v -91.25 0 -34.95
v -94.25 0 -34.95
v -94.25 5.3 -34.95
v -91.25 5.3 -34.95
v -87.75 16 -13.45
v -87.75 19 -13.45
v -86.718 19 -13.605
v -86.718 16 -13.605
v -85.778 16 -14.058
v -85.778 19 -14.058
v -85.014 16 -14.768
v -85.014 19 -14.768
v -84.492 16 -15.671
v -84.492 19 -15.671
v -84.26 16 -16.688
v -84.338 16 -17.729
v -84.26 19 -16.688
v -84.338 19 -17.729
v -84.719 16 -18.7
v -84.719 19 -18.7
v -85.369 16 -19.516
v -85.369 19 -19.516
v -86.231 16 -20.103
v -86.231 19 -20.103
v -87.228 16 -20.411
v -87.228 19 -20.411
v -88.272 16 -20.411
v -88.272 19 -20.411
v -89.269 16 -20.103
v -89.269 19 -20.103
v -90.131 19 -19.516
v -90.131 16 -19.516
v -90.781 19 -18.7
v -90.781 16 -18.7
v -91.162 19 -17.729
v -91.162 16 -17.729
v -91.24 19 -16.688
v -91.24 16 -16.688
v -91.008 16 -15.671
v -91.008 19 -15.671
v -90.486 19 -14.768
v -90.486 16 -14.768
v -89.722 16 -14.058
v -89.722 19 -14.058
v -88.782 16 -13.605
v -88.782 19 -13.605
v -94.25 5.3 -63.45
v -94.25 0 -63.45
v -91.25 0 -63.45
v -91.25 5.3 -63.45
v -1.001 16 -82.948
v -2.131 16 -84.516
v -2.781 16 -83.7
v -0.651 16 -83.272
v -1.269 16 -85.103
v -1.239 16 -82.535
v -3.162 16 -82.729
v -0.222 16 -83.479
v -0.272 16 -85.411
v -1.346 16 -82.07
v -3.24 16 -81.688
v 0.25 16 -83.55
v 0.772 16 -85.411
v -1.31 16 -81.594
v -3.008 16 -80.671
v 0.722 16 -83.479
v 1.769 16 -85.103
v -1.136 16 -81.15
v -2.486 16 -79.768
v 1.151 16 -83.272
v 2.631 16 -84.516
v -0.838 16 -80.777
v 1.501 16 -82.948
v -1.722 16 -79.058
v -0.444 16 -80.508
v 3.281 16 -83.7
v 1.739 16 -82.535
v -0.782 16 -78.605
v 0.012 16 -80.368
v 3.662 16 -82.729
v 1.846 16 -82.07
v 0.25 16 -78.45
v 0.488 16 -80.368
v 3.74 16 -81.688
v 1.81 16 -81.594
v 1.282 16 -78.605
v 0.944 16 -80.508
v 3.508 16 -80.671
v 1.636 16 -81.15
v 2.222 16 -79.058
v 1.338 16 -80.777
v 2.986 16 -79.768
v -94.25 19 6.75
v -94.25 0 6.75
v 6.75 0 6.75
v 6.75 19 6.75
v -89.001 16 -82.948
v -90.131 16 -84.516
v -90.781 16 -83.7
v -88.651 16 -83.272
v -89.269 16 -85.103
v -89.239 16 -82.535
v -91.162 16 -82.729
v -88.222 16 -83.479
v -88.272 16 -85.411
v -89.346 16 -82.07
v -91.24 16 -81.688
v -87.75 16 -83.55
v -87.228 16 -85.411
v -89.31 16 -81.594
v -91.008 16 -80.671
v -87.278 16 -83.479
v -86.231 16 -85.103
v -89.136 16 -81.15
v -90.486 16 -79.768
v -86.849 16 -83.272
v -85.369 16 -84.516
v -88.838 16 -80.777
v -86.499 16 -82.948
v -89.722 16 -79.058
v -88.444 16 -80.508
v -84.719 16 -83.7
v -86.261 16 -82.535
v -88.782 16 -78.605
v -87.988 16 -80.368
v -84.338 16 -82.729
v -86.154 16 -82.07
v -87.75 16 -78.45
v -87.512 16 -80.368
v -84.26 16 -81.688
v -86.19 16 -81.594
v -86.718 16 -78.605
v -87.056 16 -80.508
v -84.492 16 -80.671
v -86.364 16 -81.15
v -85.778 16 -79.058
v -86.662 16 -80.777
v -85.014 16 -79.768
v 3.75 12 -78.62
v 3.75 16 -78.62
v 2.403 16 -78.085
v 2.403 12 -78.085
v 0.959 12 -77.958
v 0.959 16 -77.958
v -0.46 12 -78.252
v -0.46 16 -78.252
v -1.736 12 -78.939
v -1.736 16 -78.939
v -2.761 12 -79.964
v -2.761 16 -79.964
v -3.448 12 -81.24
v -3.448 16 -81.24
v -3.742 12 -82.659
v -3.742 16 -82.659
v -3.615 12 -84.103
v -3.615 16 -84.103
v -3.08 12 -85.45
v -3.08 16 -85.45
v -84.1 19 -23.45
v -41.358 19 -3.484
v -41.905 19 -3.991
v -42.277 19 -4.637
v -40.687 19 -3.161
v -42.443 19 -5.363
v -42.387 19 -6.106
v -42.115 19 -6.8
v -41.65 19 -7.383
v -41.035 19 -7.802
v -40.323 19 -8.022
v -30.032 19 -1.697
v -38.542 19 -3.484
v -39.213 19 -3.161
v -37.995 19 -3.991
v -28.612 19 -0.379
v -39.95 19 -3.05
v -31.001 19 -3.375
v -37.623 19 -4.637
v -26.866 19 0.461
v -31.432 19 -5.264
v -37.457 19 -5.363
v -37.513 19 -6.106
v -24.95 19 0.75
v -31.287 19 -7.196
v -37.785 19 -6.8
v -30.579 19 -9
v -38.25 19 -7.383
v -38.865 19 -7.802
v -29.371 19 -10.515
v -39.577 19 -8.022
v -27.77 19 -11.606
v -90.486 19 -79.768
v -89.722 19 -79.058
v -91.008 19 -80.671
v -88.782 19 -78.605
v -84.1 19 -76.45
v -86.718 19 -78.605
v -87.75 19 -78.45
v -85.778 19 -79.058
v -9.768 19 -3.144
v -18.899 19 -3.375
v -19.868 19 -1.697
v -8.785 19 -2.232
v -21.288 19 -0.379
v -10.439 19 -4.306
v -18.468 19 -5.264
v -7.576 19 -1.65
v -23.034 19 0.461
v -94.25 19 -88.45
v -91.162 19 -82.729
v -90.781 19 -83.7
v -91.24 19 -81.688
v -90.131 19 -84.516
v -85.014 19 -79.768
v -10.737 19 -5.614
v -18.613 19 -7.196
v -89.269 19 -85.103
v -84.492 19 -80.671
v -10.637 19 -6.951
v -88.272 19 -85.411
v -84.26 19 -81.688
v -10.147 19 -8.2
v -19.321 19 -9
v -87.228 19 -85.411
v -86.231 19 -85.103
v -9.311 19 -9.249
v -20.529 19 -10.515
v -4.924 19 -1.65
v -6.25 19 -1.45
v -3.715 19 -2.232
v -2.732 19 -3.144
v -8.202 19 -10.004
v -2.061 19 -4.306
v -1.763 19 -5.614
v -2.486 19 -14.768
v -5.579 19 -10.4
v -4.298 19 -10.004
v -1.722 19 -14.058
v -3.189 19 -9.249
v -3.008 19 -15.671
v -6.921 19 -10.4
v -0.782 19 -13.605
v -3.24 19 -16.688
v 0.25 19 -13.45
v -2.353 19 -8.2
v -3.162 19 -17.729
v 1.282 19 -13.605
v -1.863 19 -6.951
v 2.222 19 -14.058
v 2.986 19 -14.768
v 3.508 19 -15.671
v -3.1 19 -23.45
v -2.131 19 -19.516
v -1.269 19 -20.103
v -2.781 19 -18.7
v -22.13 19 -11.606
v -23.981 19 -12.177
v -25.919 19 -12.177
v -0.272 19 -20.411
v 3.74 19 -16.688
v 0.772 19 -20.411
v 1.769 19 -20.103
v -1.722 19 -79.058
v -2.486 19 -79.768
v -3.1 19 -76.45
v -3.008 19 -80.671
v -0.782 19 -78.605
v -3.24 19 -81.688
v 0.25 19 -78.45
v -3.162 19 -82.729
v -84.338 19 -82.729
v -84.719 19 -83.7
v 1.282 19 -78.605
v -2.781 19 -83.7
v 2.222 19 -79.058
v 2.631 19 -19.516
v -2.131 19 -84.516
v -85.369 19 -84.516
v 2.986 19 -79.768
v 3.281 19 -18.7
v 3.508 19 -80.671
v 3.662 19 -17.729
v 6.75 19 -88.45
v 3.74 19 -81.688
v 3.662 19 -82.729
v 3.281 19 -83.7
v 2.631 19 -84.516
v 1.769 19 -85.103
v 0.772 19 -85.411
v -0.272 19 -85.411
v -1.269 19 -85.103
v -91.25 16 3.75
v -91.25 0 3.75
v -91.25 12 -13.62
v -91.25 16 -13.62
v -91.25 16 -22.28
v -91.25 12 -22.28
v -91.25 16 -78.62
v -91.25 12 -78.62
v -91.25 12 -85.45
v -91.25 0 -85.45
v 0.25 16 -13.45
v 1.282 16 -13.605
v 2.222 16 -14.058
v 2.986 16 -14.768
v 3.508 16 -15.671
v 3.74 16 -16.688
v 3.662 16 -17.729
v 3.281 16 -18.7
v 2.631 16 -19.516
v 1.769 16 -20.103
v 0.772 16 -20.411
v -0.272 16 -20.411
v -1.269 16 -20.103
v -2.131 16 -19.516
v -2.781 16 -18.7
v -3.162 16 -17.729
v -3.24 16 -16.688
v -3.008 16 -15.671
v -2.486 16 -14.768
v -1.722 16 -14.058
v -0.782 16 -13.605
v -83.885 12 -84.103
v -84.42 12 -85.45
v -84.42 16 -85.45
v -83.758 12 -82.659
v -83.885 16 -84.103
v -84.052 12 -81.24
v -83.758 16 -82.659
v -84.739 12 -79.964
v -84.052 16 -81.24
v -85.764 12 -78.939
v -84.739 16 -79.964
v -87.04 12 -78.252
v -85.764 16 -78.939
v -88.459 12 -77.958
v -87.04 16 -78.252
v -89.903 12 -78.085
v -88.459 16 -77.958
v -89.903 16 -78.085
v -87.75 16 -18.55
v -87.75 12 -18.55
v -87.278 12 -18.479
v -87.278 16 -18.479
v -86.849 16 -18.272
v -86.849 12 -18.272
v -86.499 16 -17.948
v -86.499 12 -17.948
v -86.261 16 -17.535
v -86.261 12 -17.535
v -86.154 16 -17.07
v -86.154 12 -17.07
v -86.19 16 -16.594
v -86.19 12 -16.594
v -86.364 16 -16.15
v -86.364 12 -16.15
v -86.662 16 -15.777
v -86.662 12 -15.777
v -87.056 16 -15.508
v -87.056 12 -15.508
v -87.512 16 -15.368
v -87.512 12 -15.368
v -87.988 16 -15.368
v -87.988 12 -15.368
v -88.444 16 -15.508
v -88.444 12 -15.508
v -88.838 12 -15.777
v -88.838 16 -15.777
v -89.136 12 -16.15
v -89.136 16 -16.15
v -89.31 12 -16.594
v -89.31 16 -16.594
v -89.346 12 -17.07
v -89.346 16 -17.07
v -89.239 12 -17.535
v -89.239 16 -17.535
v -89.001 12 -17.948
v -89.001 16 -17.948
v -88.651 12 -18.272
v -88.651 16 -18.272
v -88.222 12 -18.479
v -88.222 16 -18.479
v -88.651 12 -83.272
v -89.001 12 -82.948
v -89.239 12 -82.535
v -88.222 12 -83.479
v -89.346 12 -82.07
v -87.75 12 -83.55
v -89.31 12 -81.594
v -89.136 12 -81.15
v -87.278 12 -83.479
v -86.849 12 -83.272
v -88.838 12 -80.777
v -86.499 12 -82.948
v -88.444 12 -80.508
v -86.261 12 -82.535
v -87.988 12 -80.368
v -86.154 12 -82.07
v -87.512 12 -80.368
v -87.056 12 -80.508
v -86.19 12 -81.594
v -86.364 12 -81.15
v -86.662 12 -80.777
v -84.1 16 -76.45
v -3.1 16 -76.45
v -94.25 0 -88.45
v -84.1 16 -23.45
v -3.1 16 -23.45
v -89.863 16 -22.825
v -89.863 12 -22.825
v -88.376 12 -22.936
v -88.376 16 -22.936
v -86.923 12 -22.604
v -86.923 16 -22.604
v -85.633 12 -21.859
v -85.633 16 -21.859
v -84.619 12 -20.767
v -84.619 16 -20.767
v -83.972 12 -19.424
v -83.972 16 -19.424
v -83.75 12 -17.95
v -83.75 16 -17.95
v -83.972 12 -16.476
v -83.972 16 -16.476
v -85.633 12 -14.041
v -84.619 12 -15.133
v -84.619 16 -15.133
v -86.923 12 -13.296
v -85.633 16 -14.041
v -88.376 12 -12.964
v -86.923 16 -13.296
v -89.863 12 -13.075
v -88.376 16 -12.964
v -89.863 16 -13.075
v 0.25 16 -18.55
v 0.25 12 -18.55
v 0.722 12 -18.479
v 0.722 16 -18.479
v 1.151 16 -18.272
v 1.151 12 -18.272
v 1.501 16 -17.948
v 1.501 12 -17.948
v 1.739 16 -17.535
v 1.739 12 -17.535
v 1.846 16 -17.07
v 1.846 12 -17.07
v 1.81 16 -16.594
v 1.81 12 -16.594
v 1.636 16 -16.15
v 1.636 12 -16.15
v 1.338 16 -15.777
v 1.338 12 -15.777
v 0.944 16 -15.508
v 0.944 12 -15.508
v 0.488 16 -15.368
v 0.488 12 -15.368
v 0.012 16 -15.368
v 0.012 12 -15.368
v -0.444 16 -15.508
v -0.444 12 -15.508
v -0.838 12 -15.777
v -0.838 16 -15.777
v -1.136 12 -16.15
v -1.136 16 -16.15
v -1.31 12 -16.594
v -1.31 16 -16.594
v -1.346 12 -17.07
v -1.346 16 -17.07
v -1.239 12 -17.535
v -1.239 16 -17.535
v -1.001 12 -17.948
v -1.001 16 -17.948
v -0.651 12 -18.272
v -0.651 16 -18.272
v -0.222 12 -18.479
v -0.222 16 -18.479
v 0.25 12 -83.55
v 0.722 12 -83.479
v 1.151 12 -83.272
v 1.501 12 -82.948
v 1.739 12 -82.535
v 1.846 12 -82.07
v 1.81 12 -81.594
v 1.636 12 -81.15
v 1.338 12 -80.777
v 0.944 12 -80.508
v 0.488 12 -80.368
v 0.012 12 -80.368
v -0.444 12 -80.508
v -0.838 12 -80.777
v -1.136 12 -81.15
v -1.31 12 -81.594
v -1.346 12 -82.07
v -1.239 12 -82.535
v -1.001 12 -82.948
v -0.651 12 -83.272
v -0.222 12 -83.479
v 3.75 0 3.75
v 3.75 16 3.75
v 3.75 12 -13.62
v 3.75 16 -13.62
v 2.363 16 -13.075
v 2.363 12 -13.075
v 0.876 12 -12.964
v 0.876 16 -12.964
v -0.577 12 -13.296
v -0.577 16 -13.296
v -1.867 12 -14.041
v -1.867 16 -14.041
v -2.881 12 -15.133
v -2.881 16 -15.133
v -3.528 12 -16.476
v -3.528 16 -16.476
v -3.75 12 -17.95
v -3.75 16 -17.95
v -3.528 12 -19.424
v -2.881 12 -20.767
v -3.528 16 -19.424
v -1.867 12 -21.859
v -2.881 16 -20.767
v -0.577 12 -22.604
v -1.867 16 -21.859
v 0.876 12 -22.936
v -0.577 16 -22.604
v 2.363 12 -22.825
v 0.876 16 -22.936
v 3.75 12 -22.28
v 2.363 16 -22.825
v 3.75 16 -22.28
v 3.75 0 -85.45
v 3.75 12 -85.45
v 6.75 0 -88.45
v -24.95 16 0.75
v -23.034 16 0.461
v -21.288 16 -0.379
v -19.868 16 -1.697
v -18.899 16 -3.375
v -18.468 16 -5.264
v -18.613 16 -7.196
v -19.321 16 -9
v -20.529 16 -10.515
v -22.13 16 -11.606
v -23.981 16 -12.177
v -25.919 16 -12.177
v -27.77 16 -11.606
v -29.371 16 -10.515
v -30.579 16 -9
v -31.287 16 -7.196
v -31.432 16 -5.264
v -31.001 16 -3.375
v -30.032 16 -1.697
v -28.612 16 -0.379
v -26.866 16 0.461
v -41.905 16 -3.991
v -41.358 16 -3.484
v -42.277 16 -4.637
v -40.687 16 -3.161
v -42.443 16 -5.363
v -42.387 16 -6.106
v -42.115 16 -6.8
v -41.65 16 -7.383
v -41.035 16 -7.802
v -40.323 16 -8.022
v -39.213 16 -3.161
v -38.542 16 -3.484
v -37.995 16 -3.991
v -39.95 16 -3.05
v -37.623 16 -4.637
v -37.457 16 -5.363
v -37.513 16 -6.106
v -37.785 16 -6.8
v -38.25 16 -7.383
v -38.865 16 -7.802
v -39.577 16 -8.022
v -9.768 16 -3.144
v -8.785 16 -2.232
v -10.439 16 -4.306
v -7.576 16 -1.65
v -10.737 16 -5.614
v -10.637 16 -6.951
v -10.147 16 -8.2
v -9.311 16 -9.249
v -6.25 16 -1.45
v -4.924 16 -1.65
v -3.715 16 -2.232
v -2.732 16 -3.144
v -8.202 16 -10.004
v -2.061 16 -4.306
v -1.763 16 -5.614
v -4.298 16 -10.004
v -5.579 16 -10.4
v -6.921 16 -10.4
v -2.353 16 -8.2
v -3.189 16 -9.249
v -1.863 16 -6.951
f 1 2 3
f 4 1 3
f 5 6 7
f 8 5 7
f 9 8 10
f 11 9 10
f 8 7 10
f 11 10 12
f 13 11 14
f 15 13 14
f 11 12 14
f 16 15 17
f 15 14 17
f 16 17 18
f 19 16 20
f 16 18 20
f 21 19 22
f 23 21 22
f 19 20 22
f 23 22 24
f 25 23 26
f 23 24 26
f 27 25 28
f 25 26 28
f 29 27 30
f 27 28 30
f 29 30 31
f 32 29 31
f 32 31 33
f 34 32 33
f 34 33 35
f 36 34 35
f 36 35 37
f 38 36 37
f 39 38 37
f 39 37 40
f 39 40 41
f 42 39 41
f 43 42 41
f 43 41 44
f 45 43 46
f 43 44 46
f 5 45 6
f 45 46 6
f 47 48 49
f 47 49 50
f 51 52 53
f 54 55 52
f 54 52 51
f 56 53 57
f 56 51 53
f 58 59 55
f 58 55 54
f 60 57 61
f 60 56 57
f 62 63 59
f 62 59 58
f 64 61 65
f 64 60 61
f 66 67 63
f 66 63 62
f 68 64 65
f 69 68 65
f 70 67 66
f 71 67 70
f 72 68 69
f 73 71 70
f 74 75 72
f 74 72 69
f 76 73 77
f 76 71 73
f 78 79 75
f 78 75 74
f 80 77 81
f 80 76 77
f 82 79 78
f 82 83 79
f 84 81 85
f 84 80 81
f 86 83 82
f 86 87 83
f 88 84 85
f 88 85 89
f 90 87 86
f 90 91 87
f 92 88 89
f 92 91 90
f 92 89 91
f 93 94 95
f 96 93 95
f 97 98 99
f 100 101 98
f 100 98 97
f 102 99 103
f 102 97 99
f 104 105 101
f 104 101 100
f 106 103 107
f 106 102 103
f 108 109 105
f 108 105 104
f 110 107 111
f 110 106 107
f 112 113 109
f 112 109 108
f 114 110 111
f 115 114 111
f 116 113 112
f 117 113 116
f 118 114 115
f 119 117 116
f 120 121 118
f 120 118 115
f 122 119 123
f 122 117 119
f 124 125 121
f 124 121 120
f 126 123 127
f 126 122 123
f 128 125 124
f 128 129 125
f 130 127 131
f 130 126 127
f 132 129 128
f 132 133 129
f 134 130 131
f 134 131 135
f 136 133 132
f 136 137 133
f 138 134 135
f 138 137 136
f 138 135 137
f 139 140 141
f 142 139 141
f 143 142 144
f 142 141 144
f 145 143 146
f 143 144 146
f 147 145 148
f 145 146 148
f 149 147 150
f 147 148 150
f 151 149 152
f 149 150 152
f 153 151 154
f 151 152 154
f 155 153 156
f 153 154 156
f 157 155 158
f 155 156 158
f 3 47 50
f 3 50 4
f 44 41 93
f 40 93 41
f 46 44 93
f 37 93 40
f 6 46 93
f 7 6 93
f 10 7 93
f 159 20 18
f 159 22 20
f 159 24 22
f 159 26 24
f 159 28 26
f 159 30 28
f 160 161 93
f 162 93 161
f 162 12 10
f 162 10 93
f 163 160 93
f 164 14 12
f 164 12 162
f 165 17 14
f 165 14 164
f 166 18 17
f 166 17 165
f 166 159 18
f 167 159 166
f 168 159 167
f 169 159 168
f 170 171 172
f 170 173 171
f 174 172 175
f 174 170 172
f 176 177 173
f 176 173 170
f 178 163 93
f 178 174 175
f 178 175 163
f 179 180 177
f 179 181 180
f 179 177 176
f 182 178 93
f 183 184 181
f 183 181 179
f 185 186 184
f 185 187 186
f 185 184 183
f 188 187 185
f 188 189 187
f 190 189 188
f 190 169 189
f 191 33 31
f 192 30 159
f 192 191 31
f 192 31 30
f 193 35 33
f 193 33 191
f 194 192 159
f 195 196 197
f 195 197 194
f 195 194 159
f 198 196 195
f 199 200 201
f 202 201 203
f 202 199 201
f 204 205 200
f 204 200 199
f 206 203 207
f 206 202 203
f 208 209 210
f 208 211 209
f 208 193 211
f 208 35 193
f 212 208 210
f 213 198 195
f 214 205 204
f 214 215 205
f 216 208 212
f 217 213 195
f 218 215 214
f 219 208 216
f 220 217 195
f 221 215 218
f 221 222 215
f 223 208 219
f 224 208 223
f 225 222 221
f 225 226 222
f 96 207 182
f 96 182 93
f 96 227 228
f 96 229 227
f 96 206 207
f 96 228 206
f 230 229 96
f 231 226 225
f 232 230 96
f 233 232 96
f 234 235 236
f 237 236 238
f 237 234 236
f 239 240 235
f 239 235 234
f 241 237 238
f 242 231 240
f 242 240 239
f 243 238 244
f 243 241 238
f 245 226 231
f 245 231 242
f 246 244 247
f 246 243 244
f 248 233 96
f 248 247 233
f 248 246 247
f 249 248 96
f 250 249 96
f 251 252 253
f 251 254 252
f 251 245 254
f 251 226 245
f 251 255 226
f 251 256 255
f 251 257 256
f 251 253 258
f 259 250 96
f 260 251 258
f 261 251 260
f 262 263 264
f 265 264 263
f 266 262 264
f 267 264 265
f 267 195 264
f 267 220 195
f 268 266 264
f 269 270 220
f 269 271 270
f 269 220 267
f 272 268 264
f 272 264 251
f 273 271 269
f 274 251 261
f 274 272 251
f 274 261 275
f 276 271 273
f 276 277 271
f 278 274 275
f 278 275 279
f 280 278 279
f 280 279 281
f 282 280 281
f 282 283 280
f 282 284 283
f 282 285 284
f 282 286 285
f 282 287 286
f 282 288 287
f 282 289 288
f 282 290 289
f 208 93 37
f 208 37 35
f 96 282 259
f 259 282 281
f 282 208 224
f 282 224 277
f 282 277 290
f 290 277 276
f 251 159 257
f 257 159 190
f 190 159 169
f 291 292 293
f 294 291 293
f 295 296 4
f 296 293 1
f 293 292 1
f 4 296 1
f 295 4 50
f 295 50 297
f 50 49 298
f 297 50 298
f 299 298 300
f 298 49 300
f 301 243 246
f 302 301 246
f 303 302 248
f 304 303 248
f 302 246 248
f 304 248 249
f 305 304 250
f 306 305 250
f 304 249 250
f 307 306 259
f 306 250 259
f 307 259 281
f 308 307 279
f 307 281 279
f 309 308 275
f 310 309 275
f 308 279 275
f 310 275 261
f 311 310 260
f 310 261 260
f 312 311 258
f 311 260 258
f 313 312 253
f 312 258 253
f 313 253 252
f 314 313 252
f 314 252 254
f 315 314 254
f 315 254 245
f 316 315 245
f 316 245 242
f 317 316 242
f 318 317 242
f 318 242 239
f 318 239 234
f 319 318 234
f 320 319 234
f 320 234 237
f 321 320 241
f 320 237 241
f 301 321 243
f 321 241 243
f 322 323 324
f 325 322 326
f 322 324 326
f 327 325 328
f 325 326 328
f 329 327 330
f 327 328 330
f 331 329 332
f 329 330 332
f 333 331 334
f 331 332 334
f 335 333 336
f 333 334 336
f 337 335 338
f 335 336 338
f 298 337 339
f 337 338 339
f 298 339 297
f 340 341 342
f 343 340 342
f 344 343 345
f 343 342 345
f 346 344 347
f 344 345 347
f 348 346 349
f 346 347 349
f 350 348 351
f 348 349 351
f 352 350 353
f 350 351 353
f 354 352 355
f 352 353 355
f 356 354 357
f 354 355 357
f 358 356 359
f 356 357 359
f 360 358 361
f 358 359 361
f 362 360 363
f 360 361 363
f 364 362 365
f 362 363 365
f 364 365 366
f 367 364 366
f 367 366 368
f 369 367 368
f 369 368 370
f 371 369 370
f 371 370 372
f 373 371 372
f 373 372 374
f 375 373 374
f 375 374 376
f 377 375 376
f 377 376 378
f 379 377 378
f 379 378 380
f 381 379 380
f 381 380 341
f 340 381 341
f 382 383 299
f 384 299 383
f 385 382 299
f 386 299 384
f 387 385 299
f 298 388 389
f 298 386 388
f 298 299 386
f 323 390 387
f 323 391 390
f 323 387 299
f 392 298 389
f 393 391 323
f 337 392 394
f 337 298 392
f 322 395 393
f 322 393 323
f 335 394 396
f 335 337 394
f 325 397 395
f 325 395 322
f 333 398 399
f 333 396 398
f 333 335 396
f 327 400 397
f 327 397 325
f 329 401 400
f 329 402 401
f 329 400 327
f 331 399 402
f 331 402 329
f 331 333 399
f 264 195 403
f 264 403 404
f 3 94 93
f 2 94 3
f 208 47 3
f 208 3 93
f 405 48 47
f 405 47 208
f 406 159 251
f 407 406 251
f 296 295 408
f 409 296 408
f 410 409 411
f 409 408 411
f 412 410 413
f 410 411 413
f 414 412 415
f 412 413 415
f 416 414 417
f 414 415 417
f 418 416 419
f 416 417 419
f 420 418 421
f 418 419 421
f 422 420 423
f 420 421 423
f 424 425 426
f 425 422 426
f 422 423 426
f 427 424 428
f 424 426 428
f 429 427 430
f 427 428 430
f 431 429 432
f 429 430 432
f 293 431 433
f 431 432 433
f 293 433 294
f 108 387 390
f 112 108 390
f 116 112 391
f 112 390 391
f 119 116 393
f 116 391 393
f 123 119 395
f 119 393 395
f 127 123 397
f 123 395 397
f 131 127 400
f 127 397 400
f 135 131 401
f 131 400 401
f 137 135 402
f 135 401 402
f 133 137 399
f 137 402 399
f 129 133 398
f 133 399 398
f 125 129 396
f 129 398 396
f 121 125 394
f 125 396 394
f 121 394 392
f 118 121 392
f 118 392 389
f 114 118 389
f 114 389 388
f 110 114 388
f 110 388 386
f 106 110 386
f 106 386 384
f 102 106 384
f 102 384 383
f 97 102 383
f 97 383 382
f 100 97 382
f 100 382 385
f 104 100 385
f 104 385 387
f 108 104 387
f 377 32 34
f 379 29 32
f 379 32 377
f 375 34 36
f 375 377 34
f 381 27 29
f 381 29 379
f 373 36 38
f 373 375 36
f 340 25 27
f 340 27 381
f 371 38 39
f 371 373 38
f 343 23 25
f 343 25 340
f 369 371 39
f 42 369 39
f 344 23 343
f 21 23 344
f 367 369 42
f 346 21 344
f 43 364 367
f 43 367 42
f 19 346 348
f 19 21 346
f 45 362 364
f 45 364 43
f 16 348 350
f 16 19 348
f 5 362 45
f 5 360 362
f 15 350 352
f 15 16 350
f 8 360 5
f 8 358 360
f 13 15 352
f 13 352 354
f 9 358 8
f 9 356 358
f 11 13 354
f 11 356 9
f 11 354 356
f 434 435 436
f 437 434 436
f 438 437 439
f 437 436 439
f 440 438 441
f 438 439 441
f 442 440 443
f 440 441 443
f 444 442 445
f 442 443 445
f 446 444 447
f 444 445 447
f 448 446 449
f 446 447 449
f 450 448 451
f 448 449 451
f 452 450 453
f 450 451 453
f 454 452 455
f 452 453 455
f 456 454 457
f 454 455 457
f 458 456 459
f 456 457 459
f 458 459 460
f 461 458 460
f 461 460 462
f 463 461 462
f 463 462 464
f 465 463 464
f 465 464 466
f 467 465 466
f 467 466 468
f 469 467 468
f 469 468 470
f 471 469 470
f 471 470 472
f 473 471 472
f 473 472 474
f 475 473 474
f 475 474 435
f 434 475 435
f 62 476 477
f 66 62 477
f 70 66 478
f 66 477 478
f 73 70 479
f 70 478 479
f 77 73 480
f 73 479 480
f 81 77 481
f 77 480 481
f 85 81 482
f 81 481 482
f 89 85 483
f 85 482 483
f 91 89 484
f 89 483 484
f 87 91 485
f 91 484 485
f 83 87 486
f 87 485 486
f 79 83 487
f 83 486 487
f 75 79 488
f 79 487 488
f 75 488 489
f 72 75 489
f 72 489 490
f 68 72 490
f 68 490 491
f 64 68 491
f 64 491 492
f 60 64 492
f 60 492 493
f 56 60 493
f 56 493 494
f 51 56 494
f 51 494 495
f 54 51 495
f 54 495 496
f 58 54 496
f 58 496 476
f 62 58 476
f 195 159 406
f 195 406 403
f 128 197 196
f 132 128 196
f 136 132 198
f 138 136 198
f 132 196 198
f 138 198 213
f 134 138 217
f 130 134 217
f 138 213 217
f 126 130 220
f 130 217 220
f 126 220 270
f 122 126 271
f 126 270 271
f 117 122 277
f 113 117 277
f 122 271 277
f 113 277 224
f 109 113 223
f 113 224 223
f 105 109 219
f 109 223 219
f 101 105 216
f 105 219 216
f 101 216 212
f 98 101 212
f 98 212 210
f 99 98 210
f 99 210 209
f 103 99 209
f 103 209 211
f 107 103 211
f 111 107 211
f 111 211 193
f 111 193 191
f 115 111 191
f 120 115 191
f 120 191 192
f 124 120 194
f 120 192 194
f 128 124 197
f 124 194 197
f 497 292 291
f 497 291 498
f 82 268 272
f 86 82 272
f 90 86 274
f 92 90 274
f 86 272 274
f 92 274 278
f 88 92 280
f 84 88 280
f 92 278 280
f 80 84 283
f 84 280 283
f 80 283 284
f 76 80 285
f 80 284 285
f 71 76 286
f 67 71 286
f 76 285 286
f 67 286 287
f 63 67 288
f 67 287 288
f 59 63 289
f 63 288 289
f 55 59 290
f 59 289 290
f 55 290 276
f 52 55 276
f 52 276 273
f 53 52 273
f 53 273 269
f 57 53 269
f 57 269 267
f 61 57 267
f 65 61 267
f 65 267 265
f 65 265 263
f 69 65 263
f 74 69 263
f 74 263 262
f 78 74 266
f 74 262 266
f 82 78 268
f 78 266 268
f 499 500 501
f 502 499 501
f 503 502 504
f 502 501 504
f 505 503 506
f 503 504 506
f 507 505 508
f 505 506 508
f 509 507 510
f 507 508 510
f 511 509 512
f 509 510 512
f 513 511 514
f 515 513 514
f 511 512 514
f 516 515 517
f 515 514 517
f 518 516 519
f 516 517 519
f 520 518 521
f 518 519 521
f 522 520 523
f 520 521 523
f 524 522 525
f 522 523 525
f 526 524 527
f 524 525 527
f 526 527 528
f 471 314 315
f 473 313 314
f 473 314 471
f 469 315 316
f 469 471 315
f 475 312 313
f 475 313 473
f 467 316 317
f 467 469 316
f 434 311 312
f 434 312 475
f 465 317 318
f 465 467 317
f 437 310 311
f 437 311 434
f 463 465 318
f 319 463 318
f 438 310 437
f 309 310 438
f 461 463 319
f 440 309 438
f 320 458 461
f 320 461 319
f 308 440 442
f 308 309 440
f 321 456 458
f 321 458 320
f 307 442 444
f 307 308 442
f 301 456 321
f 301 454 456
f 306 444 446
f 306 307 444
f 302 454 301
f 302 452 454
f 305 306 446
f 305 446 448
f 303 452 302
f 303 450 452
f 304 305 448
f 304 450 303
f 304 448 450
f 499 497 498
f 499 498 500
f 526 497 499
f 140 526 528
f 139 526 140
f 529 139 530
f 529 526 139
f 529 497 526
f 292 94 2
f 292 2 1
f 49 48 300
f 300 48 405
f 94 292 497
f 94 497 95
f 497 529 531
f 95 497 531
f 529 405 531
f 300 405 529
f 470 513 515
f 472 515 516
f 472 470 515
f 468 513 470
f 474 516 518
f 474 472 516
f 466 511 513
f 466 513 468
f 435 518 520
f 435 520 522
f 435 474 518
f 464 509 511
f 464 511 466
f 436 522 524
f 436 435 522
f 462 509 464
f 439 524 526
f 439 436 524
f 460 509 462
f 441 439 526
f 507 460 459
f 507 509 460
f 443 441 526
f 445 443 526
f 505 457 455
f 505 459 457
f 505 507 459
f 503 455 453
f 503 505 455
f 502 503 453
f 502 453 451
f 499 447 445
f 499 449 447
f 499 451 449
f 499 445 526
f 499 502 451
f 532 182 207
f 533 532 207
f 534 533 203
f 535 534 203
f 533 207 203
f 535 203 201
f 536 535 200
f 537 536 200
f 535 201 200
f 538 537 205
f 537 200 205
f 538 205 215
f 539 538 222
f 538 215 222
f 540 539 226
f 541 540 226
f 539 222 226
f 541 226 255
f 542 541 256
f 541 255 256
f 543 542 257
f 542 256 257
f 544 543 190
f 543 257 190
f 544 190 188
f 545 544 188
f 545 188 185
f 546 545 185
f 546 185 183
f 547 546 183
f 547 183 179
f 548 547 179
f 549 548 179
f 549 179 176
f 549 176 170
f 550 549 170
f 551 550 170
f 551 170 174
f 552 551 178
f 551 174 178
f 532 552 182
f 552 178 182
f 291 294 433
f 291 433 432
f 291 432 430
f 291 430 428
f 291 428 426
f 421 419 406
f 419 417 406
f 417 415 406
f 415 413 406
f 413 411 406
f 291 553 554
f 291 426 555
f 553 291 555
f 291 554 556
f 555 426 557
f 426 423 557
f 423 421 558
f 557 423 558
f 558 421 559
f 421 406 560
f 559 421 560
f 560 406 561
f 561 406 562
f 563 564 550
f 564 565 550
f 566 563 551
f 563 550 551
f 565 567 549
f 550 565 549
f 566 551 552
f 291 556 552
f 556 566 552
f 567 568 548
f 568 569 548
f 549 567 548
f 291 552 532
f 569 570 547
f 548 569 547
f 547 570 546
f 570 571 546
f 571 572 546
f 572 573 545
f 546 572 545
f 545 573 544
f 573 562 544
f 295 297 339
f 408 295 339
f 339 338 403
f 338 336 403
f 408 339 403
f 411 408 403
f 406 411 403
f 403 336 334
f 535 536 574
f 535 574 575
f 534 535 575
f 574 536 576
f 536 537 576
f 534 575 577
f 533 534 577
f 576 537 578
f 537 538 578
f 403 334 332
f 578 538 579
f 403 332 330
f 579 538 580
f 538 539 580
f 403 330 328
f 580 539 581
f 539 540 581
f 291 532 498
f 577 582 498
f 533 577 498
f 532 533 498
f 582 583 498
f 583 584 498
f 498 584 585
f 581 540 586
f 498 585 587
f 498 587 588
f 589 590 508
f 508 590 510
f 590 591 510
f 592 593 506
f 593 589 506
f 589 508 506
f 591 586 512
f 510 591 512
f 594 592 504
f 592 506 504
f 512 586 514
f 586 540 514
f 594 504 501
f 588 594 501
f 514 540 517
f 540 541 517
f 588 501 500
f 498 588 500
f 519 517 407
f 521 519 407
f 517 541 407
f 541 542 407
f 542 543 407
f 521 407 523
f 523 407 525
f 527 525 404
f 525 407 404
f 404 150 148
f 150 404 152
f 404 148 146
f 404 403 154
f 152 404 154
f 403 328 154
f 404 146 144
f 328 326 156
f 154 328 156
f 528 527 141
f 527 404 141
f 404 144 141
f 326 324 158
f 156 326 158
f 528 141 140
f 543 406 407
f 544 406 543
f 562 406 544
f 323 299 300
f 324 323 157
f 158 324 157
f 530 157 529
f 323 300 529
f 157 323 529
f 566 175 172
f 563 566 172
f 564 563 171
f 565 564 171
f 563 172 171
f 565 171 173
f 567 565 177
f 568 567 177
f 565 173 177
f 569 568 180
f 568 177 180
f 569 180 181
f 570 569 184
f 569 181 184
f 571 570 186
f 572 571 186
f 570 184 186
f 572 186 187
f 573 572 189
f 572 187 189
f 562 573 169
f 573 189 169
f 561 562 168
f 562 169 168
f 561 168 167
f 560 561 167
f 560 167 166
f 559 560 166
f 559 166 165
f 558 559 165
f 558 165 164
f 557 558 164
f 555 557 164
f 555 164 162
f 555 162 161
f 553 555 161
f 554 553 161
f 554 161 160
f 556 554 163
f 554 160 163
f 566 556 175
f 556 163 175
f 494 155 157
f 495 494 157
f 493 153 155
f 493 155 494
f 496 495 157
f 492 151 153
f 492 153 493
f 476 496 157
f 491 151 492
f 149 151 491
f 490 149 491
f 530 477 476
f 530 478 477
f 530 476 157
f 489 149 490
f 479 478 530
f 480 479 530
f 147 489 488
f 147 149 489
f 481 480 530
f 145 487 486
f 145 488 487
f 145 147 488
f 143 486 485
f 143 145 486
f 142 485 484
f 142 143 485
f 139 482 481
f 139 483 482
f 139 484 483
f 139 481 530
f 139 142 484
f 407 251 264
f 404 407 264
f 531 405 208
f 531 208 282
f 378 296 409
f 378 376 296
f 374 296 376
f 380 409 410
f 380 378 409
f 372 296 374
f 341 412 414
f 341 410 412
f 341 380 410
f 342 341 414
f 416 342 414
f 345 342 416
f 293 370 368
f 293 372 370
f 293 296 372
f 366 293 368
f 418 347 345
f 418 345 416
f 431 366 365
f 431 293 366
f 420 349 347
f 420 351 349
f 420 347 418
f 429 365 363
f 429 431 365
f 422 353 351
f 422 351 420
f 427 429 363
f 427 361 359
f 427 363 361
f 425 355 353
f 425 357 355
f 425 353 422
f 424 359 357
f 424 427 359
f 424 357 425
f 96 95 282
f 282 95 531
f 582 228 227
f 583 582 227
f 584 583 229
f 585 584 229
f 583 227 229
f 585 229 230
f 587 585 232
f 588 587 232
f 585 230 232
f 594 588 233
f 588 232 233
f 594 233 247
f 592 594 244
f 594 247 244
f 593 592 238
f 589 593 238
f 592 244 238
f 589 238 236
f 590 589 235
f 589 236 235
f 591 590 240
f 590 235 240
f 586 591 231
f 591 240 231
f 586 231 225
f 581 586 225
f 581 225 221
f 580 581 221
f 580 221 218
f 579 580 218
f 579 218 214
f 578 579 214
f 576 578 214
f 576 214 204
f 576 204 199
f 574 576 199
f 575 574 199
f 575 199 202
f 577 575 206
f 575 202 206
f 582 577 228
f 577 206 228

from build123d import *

# Parameters (mm, degrees)
SKETCH1_W           = 101
SKETCH1_H           = 95.2
BOSS_EXTRUDE1_DEPTH = 19
SHELL1_T            = -3
SKETCH3_R           = 5
BOSS_EXTRUDE2_DEPTH = 4
SKETCH4_R           = 1.6
CUT_EXTRUDE2_DEPTH  = 22
SKETCH6_W           = 28.5
SKETCH6_H           = 5.3
CUT_EXTRUDE3_DEPTH  = 22
SKETCH2_R           = 3.5
SKETCH2_R_2         = 4.5
SKETCH2_R_3         = 6.5
SKETCH2_R_4         = 2.5
SKETCH2_W           = 81
SKETCH2_H           = 53
CUT_EXTRUDE5_DEPTH  = 3


with BuildPart() as part:
    # Sketch1 → Boss-Extrude1 (new body)
    with BuildSketch(Plane(origin=(0, 0, 0), x_dir=(1, 0, 0), z_dir=(0, 1, 0))):
        with Locations((-43.75, 40.85)):
            Rectangle(SKETCH1_W, SKETCH1_H)
    extrude(amount=BOSS_EXTRUDE1_DEPTH)

    # Shell1
    shell1_openings = [part.faces().sort_by_distance(p)[0] for p in [
        (-43.75, 0, -40.85),
    ]]
    offset(amount=SHELL1_T, openings=shell1_openings, kind=Kind.INTERSECTION)

    # Sketch3 → Boss-Extrude2 (add)
    with BuildSketch(Plane.XZ.offset(-16)):
        with Locations((1.25, -82.95)):
            Circle(SKETCH3_R)
        with Locations((-88.75, -82.95)):
            Circle(SKETCH3_R)
        with Locations((-88.75, -17.95)):
            Circle(SKETCH3_R)
        with Locations((1.25, -17.95)):
            Circle(SKETCH3_R)
    extrude(amount=BOSS_EXTRUDE2_DEPTH)

    # Sketch4 → Cut-Extrude2 (cut)
    with BuildSketch(Plane.XZ.offset(-12)):
        with Locations(Location((0.25, -16.95, 0), (0, 0, 270))):
            Circle(SKETCH4_R)
        with Locations(Location((-87.75, -16.95, 0), (0, 0, 270))):
            Circle(SKETCH4_R)
        with Locations(Location((-87.75, -81.95, 0), (0, 0, 270))):
            Circle(SKETCH4_R)
        with Locations(Location((0.25, -81.95, 0), (0, 0, 270))):
            Circle(SKETCH4_R)
    extrude(amount=-CUT_EXTRUDE2_DEPTH, mode=Mode.SUBTRACT)

    # Sketch6 → Cut-Extrude3 (cut)
    with BuildSketch(Plane.ZY.offset(94.25)):
        with Locations((-49.2, 2.65)):
            Rectangle(SKETCH6_W, SKETCH6_H)
    extrude(amount=-CUT_EXTRUDE3_DEPTH, mode=Mode.SUBTRACT)

    # Sketch2 → Cut-Extrude5 (cut)
    with BuildSketch(Plane(origin=(0, 19, 0), x_dir=(1, 0, 0), z_dir=(0, 1, 0))):
        with Locations(Location((-87.75, 81.95, 0), (0, 0, 270))):
            Circle(SKETCH2_R)
        with Locations(Location((0.25, 81.95, 0), (0, 0, 270))):
            Circle(SKETCH2_R)
        with Locations(Location((-87.75, 16.95, 0), (0, 0, 270))):
            Circle(SKETCH2_R)
        with Locations(Location((0.25, 16.95, 0), (0, 0, 270))):
            Circle(SKETCH2_R)
        with Locations(Location((-6.25, 5.95, 0), (0, 0, 270))):
            Circle(SKETCH2_R_2)
        with Locations(Location((-24.95, 5.75, 0), (0, 0, 270))):
            Circle(SKETCH2_R_3)
        with Locations(Location((-39.95, 5.55, 0), (0, 0, 270))):
            Circle(SKETCH2_R_4)
        with Locations((-43.6, 49.95)):
            Rectangle(SKETCH2_W, SKETCH2_H)
    extrude(amount=-CUT_EXTRUDE5_DEPTH, mode=Mode.SUBTRACT)


solid = part.part
